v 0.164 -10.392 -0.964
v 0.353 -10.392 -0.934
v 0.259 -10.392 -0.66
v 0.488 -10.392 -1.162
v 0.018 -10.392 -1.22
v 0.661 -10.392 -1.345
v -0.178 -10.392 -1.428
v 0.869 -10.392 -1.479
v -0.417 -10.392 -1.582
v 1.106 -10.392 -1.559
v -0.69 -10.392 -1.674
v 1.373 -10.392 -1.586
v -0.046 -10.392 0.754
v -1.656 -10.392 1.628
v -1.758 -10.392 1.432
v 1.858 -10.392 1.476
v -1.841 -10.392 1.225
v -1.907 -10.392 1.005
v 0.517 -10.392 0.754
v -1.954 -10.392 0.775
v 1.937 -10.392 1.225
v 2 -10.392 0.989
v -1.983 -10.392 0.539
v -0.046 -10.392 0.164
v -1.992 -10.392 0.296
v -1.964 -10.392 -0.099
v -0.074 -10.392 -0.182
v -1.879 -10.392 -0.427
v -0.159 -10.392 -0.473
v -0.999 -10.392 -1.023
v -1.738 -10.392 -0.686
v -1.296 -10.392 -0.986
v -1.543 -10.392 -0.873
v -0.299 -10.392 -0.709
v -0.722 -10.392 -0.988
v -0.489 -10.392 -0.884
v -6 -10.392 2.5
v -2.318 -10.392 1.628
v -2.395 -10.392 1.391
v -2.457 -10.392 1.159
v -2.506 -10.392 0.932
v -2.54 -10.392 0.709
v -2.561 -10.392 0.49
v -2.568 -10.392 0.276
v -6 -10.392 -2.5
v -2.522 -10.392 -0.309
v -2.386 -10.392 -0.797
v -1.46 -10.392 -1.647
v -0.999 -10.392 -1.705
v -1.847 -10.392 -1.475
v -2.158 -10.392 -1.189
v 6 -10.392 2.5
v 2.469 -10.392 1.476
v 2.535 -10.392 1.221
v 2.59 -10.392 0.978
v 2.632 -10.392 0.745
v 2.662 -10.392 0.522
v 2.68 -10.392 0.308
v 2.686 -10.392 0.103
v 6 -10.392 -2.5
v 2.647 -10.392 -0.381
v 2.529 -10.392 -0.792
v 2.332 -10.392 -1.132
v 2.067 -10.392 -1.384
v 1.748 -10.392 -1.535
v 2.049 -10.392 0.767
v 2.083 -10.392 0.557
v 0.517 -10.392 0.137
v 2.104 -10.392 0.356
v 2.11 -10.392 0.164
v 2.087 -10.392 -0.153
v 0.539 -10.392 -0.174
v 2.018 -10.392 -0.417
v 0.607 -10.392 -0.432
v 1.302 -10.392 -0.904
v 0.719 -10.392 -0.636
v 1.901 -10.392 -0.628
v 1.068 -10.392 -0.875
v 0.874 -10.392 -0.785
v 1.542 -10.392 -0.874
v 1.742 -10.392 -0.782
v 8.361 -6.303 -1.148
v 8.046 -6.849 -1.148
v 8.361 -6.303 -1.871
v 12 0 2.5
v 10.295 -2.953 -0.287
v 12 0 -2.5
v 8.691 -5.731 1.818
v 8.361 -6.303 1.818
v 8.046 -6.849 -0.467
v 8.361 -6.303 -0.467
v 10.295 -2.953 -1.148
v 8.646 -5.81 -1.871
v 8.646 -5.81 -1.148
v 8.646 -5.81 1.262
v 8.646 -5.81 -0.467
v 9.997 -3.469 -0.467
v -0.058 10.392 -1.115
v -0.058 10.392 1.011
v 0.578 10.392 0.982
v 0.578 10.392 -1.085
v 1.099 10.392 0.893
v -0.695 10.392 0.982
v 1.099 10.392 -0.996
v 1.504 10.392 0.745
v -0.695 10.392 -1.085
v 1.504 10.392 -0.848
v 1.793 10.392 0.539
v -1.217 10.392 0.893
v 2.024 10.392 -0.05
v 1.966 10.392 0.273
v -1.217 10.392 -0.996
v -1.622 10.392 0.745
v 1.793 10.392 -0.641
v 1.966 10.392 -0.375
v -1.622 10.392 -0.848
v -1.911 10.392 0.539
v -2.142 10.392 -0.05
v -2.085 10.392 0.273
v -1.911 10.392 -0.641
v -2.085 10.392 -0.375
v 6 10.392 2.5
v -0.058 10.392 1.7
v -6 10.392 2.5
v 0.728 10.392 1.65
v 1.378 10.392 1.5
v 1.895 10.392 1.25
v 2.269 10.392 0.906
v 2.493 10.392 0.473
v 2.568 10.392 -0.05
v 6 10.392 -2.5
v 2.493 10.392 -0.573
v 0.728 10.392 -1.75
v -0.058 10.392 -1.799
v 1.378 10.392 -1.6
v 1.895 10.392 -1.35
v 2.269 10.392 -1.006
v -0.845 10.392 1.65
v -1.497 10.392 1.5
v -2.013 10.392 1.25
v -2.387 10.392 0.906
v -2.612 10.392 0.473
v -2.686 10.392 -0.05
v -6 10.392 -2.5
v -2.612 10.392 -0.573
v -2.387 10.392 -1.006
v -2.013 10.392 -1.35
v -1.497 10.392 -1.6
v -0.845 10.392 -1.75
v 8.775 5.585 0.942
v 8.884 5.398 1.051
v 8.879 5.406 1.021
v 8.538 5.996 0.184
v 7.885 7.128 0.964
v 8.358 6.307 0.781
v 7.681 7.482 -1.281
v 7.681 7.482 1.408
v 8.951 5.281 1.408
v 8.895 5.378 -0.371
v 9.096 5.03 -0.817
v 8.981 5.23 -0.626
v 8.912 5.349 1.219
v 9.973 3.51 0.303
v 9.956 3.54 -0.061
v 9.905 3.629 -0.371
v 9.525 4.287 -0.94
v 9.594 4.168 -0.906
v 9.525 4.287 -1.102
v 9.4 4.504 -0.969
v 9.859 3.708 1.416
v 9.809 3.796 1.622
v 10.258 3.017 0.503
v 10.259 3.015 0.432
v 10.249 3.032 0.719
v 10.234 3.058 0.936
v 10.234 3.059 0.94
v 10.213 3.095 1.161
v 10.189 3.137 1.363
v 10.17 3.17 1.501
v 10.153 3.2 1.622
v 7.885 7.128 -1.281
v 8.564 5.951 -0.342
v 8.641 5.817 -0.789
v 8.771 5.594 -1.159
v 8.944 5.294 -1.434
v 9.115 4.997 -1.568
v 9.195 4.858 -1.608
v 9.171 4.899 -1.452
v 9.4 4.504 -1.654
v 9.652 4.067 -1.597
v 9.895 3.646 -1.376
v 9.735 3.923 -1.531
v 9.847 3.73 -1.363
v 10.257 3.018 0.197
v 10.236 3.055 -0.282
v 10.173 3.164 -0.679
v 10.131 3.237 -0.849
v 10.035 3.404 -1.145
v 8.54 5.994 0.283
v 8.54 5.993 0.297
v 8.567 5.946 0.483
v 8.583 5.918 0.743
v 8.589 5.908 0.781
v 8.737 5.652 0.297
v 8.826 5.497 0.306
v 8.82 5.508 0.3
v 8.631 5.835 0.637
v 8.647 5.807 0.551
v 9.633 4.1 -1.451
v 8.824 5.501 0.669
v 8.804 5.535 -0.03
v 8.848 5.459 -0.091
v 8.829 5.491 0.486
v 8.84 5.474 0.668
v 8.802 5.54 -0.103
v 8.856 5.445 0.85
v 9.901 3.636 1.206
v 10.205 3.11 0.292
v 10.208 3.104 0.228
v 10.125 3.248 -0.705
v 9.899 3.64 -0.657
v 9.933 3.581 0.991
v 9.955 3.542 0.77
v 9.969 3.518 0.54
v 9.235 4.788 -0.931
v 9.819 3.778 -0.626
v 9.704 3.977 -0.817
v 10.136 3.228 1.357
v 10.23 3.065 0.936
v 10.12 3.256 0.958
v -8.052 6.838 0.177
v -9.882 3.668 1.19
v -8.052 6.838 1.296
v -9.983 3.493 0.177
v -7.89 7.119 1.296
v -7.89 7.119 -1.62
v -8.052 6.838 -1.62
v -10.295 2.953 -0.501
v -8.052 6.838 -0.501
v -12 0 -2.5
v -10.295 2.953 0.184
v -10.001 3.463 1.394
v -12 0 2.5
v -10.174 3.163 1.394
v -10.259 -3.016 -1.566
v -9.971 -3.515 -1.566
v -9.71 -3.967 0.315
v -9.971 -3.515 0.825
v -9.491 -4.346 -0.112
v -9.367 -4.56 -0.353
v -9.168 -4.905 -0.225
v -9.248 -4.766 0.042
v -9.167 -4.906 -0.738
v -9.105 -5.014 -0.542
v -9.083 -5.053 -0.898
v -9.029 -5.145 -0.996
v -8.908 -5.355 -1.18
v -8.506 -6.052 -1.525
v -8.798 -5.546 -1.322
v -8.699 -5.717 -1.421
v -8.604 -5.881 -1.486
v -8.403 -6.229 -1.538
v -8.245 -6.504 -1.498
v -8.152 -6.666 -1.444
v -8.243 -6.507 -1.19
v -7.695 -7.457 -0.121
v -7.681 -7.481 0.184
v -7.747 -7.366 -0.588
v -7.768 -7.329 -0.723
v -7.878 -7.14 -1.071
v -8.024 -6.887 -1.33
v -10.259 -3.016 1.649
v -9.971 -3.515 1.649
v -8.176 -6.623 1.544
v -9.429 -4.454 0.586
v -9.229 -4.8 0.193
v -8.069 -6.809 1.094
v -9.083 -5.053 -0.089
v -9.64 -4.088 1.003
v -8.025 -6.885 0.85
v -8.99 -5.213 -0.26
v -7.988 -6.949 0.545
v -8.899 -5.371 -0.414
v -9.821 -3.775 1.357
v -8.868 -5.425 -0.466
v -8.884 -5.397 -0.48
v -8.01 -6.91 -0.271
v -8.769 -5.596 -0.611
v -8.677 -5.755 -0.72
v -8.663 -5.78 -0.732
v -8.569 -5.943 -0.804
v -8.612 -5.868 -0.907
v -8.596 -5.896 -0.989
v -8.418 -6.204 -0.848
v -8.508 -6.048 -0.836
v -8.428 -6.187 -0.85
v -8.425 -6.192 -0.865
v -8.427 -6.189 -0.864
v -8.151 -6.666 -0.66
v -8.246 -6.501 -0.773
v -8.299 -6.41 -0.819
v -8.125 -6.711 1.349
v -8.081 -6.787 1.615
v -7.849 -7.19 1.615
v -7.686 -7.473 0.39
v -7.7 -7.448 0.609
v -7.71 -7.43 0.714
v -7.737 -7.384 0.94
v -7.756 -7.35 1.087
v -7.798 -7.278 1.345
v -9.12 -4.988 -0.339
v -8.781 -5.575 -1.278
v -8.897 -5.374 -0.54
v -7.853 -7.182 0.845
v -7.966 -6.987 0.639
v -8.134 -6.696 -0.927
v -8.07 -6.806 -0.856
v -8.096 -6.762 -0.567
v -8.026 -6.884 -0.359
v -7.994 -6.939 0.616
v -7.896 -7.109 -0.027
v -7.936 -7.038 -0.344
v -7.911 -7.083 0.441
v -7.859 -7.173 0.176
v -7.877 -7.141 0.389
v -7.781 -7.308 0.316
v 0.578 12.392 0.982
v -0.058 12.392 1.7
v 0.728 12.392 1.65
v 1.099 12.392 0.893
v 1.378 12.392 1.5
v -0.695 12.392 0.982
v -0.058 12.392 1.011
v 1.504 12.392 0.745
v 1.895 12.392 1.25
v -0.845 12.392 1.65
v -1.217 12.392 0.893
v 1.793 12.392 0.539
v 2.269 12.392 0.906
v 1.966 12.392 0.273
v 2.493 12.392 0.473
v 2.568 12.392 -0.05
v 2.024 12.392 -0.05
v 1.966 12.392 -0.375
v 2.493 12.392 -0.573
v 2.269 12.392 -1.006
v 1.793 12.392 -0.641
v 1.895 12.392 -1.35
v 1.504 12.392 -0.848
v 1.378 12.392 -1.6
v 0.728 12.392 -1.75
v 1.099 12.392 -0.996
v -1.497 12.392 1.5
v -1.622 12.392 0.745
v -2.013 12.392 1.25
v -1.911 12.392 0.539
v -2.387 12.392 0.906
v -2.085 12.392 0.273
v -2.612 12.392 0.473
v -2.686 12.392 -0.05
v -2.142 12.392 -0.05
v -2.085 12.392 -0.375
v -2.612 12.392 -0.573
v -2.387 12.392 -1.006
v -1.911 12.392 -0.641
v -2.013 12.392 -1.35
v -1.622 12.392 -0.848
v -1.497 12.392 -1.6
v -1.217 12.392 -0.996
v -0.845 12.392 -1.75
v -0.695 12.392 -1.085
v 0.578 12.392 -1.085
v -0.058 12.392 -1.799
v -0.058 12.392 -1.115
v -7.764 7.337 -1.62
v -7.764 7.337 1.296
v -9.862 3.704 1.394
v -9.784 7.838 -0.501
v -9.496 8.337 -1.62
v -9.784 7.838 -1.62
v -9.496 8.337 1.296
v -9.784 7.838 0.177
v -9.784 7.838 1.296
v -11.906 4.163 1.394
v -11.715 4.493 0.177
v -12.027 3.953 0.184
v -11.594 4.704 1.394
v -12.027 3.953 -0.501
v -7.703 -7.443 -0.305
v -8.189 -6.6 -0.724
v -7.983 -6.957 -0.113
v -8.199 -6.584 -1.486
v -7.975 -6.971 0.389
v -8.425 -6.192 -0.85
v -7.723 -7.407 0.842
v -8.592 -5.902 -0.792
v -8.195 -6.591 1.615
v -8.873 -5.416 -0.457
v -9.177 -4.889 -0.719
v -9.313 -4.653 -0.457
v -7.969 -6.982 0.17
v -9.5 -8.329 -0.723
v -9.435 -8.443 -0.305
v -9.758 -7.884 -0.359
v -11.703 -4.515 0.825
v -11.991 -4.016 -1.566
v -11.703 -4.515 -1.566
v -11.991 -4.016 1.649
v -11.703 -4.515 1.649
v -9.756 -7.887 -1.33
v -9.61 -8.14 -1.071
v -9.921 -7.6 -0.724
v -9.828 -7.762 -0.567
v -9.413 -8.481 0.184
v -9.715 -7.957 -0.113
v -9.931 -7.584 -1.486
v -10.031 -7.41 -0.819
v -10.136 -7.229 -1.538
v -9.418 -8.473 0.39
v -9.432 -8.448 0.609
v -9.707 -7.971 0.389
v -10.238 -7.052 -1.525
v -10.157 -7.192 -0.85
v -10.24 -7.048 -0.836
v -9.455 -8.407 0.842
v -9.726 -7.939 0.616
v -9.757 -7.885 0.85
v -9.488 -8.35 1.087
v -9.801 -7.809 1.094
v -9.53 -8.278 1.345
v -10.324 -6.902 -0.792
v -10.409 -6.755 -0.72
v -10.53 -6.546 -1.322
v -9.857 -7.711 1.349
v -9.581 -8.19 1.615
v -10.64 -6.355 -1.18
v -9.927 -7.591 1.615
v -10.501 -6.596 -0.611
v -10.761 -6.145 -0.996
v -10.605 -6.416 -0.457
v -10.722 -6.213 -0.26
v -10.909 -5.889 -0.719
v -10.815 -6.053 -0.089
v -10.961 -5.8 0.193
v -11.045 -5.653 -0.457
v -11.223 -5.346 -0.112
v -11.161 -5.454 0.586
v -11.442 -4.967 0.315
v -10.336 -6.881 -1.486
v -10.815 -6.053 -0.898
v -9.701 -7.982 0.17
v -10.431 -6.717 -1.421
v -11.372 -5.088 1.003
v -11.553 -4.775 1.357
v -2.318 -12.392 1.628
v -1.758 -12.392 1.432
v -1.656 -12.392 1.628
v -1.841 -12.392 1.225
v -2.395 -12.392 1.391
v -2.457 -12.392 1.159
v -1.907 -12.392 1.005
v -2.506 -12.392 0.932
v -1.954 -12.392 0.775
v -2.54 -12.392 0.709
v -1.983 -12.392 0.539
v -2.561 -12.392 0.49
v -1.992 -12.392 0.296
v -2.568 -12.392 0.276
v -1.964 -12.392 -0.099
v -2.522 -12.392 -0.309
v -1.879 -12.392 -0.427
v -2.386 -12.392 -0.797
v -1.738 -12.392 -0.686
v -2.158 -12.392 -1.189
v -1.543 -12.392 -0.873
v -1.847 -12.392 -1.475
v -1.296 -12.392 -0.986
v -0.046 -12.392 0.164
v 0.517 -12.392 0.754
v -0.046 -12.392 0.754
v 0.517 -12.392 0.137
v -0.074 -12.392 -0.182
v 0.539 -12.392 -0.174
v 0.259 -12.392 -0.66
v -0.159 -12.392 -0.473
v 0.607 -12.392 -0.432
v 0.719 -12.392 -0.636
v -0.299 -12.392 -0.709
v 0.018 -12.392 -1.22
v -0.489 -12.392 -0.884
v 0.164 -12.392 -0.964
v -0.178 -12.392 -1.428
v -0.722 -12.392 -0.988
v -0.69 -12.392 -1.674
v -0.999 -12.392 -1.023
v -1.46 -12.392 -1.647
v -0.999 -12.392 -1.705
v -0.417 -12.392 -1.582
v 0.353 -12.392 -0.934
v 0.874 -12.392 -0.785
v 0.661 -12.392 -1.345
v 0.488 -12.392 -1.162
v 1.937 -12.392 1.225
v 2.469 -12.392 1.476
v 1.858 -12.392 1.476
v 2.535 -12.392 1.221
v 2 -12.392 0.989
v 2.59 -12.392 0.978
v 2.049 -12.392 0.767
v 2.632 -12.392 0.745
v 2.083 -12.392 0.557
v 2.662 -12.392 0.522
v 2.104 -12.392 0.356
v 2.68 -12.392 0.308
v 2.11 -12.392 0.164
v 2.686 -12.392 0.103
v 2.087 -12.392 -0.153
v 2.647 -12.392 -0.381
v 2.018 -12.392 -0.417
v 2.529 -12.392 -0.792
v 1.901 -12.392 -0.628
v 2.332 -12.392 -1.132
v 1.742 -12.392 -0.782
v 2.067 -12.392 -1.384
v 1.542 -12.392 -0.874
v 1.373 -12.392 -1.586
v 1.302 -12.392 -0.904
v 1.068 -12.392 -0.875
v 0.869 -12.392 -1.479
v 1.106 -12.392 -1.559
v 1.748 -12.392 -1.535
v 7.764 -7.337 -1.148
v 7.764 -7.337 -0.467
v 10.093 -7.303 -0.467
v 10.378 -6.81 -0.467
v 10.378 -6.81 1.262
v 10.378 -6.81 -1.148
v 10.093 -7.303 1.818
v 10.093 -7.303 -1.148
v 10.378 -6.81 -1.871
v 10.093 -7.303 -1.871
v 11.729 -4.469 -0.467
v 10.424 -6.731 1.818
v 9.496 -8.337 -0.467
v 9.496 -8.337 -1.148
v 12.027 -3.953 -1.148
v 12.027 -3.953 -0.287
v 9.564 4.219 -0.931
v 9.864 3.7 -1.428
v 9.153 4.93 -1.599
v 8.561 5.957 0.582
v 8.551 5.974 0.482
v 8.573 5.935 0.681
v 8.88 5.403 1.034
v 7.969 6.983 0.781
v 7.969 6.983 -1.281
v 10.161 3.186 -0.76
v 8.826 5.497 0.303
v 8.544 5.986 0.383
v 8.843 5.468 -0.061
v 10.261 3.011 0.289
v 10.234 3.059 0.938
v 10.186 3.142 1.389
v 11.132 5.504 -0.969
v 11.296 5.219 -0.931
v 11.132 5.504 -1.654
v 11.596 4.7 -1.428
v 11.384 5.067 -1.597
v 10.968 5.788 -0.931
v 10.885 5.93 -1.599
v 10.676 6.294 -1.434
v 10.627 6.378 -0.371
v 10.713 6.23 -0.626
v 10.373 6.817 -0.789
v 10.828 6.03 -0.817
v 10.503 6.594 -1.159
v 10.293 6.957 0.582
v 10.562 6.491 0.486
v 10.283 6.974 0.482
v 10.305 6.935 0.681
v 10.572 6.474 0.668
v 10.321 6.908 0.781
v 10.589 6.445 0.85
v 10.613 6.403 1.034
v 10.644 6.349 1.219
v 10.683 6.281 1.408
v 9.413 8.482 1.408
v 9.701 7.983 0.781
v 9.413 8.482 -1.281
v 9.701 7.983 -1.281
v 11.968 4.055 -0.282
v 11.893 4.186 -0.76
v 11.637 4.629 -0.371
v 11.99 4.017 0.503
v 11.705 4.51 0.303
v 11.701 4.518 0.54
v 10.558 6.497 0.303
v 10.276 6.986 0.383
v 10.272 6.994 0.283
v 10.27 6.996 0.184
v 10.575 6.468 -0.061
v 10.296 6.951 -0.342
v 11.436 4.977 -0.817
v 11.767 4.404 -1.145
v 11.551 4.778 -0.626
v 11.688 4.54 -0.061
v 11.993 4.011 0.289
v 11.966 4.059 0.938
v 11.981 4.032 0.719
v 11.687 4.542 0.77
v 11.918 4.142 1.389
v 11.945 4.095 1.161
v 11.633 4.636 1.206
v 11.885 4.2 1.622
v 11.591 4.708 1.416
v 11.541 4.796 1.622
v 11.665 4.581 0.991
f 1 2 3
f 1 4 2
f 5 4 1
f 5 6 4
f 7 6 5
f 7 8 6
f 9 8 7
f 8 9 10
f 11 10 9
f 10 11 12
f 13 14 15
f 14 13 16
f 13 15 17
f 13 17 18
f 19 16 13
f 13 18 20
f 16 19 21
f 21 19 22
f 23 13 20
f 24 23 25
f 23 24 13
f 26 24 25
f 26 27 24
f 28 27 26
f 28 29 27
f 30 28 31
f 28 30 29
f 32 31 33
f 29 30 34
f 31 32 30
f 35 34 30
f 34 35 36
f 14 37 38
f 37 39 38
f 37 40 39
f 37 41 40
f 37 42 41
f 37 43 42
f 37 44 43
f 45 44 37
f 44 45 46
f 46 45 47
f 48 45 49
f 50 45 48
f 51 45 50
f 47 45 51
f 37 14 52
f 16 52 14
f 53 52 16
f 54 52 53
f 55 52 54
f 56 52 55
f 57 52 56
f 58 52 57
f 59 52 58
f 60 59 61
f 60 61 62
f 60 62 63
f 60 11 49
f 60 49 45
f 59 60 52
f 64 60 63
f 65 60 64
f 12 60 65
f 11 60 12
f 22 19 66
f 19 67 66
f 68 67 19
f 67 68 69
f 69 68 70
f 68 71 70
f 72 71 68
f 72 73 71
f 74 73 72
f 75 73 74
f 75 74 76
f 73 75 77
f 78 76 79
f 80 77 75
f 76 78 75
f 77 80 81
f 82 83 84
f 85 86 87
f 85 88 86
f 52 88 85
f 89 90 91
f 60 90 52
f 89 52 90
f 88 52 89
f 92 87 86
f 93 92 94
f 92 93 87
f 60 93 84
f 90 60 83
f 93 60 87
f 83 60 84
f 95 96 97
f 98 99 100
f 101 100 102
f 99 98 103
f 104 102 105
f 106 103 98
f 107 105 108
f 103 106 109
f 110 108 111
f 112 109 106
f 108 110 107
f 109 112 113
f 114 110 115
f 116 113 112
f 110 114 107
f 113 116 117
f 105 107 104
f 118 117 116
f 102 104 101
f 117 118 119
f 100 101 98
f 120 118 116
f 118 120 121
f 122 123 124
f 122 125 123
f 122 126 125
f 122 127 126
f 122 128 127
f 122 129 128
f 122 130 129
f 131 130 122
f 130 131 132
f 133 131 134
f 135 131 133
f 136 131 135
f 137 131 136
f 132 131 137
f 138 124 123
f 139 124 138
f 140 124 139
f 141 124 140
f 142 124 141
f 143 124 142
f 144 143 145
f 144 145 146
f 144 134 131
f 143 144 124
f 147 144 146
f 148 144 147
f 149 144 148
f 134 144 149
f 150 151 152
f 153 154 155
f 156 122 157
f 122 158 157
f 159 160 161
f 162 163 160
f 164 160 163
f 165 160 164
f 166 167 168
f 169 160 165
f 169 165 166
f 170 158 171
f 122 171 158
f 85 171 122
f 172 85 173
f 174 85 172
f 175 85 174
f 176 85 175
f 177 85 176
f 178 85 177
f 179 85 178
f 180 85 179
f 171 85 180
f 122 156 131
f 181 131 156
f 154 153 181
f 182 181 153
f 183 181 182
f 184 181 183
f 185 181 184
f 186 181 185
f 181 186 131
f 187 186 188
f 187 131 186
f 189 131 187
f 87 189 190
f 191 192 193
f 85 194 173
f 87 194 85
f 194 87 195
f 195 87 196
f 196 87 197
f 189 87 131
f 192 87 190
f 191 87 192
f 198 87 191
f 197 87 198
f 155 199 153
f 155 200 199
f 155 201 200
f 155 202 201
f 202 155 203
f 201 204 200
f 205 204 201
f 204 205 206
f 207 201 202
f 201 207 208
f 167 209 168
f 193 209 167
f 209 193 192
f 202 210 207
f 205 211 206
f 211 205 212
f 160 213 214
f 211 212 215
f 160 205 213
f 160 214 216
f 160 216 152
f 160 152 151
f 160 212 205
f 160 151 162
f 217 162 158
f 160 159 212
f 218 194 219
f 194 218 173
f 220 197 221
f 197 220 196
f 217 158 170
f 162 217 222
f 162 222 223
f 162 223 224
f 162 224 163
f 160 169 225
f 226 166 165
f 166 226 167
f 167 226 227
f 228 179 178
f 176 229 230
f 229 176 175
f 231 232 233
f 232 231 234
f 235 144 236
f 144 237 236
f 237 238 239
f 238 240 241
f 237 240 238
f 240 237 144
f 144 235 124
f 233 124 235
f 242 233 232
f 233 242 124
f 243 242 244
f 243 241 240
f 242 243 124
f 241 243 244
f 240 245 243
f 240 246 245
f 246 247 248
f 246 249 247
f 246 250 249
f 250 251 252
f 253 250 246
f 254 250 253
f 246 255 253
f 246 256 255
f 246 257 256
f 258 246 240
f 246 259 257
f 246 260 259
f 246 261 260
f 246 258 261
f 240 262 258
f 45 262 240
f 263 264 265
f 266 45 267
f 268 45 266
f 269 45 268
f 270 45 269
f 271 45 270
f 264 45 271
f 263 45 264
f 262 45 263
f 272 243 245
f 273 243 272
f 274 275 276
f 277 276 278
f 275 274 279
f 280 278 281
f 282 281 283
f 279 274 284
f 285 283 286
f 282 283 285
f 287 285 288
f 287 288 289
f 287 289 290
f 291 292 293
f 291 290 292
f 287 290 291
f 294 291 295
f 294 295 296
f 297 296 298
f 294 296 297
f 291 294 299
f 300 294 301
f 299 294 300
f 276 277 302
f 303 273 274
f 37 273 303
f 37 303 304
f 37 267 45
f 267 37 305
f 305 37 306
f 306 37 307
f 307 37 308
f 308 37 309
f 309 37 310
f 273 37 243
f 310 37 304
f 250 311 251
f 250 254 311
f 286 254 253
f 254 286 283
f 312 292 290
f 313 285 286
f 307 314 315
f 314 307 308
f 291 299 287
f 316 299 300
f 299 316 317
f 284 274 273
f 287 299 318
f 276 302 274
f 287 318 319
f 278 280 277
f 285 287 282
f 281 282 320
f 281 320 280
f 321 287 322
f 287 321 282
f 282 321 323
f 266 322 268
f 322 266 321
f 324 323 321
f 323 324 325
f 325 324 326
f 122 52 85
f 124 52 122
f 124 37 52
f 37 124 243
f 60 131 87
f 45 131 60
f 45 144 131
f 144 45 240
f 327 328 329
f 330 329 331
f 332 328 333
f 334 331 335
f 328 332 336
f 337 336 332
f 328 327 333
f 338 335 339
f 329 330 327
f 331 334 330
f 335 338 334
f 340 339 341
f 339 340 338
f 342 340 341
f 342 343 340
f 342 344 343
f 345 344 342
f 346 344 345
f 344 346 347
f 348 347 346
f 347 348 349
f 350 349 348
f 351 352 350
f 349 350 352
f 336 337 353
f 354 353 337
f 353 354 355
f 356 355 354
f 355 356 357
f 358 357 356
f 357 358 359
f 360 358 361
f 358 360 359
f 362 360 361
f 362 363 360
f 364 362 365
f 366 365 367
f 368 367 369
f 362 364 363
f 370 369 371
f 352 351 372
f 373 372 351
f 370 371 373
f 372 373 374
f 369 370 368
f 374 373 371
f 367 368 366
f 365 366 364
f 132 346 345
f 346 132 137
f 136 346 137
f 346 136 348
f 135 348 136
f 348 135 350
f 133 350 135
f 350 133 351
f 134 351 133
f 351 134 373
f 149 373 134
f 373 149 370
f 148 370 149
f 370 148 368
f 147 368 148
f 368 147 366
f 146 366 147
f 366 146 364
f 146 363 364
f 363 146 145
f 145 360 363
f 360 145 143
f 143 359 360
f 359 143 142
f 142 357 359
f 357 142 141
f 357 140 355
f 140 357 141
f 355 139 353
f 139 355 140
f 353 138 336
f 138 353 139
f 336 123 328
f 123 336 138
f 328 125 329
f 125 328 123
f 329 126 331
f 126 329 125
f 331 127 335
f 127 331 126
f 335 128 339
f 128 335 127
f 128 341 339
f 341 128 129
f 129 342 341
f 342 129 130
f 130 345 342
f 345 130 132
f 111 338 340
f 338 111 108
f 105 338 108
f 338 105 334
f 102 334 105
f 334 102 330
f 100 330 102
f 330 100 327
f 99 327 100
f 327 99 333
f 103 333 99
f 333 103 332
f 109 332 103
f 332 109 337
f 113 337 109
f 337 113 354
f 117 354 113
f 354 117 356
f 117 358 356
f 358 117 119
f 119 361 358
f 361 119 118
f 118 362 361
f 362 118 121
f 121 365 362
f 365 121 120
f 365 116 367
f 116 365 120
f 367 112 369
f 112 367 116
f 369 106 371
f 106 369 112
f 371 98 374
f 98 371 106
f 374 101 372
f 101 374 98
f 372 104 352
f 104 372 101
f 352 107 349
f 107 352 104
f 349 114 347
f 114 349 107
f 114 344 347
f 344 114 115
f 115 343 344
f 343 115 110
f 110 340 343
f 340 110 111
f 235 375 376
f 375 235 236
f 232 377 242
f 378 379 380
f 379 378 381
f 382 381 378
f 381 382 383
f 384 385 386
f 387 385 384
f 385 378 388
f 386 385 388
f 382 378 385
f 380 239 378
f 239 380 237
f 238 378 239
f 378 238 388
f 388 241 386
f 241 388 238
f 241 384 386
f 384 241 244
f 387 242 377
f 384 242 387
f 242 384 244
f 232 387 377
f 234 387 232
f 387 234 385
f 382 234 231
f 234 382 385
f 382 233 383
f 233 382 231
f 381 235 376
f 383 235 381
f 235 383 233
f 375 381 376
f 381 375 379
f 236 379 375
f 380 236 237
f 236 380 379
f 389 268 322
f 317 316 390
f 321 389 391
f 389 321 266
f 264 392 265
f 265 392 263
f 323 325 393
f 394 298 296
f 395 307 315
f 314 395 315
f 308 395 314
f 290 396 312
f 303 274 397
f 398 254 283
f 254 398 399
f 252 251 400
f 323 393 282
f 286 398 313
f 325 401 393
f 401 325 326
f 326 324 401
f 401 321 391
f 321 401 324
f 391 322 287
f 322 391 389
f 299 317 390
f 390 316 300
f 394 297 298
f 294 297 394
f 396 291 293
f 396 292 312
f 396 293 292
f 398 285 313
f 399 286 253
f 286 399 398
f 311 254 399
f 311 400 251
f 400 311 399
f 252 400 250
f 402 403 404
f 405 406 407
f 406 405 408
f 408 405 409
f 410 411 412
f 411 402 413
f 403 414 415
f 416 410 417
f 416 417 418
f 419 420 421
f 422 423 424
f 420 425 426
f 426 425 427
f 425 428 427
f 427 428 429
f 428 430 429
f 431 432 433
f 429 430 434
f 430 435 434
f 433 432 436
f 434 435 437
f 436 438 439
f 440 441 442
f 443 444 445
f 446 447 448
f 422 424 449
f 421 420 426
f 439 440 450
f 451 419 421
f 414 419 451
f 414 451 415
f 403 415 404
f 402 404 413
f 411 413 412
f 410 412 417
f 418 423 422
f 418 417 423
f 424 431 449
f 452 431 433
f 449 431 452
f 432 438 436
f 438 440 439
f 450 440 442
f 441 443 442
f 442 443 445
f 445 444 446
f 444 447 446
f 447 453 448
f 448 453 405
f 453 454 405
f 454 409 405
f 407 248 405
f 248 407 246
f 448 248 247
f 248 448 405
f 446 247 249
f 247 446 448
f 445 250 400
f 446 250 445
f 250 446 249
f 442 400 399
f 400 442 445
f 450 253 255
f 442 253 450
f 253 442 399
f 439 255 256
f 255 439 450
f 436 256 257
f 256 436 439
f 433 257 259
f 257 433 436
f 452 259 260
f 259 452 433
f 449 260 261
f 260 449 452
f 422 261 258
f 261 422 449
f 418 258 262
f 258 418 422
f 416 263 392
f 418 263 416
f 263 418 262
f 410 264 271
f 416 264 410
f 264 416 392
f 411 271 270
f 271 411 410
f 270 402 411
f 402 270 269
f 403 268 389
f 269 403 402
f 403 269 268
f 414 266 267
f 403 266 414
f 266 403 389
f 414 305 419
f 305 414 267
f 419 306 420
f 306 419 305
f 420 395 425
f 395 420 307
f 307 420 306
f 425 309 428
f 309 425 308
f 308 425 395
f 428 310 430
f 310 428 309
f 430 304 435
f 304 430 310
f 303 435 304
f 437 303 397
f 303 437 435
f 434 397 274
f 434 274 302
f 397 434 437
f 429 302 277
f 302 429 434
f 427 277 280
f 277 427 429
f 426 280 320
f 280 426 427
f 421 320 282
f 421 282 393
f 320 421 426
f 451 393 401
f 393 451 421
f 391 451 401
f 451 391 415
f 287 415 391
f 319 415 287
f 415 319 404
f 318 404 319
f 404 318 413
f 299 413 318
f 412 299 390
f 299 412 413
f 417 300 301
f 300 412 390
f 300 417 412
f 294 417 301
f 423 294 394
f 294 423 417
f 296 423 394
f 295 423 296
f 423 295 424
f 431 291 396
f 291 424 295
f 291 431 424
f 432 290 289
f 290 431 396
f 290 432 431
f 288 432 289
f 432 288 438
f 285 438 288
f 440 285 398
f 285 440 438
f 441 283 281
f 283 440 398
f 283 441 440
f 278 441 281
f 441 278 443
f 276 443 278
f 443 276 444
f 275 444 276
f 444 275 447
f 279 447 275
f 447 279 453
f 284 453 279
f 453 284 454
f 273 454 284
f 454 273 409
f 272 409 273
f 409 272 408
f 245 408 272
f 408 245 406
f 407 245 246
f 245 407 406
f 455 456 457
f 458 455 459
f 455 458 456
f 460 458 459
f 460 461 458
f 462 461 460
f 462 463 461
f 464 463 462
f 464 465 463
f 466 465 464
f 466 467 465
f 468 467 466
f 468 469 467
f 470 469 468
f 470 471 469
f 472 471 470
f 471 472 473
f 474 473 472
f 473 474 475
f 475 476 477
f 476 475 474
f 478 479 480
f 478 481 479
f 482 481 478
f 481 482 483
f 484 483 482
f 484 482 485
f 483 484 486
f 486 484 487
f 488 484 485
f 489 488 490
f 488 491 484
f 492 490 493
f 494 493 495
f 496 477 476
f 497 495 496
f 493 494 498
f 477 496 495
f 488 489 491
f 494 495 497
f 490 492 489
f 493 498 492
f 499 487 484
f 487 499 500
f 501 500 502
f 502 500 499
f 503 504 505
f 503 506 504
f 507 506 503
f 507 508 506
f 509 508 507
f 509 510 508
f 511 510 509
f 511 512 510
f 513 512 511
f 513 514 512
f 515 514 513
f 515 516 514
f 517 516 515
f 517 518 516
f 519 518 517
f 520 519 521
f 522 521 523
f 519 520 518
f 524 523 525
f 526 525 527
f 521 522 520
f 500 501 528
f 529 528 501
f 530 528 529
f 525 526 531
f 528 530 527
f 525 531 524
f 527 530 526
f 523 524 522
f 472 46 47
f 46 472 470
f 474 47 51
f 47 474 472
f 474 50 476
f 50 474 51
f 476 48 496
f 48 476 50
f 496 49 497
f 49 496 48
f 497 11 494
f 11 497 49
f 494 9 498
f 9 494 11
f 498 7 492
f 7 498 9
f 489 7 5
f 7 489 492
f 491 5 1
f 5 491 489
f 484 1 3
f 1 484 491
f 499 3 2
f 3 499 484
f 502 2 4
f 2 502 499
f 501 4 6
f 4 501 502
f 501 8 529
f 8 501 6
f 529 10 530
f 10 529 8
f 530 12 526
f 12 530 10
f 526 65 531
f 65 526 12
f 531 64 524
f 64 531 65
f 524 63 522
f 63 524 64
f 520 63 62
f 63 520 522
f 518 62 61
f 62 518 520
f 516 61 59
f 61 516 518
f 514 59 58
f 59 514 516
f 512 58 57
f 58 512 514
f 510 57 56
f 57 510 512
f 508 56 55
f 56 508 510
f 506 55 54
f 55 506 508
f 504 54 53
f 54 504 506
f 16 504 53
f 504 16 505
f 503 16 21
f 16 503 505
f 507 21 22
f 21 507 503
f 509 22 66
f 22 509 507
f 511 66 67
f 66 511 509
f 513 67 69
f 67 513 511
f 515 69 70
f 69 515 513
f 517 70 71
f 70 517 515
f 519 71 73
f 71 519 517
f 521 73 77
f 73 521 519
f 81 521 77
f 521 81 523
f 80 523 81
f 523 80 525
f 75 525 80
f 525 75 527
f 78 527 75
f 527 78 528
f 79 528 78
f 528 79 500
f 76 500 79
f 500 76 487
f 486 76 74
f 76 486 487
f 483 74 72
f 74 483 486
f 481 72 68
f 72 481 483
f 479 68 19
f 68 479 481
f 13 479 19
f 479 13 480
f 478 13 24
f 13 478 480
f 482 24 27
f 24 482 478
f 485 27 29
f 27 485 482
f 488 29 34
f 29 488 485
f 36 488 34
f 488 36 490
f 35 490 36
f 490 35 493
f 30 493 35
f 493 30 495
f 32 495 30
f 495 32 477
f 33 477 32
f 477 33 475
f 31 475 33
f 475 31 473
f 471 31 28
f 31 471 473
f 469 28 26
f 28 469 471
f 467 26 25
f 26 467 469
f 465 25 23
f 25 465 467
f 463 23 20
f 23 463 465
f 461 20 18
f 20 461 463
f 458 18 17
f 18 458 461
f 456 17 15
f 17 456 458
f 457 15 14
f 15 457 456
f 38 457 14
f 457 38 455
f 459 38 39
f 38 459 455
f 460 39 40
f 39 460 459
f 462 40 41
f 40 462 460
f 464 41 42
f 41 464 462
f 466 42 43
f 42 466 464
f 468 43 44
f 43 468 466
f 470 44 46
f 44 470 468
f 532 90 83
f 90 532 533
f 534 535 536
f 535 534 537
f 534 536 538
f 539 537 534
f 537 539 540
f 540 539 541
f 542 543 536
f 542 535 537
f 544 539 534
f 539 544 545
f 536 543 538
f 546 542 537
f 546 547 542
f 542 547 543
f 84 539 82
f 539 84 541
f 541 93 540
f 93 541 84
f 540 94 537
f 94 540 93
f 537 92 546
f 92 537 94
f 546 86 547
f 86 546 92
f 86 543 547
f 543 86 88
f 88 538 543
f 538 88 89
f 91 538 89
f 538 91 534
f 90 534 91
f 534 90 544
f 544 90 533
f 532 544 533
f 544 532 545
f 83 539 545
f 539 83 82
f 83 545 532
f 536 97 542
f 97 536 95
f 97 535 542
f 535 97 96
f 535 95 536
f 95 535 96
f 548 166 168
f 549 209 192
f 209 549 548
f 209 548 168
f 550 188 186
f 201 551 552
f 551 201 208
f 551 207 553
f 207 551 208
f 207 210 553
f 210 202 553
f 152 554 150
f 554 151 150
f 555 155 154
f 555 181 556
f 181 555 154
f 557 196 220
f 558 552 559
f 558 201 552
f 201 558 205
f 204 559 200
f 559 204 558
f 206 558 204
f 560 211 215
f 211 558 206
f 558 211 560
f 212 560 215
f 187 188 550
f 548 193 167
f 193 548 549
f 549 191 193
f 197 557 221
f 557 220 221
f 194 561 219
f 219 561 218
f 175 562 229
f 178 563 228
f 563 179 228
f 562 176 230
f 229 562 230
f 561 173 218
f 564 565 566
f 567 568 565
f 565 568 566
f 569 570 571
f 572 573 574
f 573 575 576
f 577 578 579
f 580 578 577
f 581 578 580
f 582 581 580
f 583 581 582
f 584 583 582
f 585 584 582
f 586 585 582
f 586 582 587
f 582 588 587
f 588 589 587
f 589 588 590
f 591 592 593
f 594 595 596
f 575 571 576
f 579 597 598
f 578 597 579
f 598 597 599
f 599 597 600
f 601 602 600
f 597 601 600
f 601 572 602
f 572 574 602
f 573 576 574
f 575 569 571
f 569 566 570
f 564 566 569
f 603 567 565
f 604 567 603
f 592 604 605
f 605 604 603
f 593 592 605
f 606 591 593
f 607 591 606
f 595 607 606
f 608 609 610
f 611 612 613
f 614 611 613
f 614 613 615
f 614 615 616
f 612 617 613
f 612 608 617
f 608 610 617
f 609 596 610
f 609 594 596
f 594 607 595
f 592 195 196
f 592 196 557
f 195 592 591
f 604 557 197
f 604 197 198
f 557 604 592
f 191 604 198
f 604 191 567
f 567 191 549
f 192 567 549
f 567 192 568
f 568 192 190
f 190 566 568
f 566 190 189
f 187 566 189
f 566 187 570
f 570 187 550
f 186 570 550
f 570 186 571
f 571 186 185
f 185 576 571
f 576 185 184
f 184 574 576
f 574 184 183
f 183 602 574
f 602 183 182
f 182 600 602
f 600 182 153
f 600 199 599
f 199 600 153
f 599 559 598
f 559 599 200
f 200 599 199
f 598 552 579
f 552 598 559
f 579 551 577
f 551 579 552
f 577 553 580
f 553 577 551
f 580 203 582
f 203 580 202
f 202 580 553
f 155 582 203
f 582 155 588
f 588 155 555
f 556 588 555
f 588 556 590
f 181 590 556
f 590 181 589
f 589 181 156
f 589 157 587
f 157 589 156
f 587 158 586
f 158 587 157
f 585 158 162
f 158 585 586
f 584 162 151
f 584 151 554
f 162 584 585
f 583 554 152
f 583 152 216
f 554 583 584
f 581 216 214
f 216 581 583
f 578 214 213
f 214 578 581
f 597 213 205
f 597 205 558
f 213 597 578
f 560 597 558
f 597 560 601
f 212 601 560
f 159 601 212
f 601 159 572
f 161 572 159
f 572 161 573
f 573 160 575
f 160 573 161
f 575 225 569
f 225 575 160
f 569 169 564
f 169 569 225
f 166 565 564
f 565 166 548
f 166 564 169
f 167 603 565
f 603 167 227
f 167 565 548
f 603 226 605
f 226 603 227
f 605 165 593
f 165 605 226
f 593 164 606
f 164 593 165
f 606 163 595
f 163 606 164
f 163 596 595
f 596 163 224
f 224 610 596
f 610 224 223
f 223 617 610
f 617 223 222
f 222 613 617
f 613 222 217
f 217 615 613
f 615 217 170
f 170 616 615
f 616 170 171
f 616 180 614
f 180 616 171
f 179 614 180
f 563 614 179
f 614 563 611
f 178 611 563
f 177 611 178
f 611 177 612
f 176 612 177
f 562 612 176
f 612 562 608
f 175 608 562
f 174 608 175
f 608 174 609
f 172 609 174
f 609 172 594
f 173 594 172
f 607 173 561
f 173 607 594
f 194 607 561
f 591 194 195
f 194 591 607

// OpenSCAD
R = 12;
sides = 6;

#cylinder(r=R, h=5, $fn=sides, center=true);

module stamp_text(text) {
rotate([0,90,90])
  translate([0,0,R*sin(60)])
    linear_extrude(height = 2) {
      text(text, size = 5, font = "Hiragino Mincho ProN", halign="center", valign="center");
    }
}



stamp_text(text="0");

in_angle = 60;
    
//z軸を中心に回転
rotate(a=in_angle, v=[0,0,1])
stamp_text(text="1");

rotate(a=in_angle*2, v=[0,0,1])
stamp_text(text="2");

rotate(a=in_angle*3, v=[0,0,1])
stamp_text(text="3");

rotate(a=in_angle*4, v=[0,0,1])
stamp_text(text="4");

rotate(a=in_angle*5, v=[0,0,1])
stamp_text(text="5");
